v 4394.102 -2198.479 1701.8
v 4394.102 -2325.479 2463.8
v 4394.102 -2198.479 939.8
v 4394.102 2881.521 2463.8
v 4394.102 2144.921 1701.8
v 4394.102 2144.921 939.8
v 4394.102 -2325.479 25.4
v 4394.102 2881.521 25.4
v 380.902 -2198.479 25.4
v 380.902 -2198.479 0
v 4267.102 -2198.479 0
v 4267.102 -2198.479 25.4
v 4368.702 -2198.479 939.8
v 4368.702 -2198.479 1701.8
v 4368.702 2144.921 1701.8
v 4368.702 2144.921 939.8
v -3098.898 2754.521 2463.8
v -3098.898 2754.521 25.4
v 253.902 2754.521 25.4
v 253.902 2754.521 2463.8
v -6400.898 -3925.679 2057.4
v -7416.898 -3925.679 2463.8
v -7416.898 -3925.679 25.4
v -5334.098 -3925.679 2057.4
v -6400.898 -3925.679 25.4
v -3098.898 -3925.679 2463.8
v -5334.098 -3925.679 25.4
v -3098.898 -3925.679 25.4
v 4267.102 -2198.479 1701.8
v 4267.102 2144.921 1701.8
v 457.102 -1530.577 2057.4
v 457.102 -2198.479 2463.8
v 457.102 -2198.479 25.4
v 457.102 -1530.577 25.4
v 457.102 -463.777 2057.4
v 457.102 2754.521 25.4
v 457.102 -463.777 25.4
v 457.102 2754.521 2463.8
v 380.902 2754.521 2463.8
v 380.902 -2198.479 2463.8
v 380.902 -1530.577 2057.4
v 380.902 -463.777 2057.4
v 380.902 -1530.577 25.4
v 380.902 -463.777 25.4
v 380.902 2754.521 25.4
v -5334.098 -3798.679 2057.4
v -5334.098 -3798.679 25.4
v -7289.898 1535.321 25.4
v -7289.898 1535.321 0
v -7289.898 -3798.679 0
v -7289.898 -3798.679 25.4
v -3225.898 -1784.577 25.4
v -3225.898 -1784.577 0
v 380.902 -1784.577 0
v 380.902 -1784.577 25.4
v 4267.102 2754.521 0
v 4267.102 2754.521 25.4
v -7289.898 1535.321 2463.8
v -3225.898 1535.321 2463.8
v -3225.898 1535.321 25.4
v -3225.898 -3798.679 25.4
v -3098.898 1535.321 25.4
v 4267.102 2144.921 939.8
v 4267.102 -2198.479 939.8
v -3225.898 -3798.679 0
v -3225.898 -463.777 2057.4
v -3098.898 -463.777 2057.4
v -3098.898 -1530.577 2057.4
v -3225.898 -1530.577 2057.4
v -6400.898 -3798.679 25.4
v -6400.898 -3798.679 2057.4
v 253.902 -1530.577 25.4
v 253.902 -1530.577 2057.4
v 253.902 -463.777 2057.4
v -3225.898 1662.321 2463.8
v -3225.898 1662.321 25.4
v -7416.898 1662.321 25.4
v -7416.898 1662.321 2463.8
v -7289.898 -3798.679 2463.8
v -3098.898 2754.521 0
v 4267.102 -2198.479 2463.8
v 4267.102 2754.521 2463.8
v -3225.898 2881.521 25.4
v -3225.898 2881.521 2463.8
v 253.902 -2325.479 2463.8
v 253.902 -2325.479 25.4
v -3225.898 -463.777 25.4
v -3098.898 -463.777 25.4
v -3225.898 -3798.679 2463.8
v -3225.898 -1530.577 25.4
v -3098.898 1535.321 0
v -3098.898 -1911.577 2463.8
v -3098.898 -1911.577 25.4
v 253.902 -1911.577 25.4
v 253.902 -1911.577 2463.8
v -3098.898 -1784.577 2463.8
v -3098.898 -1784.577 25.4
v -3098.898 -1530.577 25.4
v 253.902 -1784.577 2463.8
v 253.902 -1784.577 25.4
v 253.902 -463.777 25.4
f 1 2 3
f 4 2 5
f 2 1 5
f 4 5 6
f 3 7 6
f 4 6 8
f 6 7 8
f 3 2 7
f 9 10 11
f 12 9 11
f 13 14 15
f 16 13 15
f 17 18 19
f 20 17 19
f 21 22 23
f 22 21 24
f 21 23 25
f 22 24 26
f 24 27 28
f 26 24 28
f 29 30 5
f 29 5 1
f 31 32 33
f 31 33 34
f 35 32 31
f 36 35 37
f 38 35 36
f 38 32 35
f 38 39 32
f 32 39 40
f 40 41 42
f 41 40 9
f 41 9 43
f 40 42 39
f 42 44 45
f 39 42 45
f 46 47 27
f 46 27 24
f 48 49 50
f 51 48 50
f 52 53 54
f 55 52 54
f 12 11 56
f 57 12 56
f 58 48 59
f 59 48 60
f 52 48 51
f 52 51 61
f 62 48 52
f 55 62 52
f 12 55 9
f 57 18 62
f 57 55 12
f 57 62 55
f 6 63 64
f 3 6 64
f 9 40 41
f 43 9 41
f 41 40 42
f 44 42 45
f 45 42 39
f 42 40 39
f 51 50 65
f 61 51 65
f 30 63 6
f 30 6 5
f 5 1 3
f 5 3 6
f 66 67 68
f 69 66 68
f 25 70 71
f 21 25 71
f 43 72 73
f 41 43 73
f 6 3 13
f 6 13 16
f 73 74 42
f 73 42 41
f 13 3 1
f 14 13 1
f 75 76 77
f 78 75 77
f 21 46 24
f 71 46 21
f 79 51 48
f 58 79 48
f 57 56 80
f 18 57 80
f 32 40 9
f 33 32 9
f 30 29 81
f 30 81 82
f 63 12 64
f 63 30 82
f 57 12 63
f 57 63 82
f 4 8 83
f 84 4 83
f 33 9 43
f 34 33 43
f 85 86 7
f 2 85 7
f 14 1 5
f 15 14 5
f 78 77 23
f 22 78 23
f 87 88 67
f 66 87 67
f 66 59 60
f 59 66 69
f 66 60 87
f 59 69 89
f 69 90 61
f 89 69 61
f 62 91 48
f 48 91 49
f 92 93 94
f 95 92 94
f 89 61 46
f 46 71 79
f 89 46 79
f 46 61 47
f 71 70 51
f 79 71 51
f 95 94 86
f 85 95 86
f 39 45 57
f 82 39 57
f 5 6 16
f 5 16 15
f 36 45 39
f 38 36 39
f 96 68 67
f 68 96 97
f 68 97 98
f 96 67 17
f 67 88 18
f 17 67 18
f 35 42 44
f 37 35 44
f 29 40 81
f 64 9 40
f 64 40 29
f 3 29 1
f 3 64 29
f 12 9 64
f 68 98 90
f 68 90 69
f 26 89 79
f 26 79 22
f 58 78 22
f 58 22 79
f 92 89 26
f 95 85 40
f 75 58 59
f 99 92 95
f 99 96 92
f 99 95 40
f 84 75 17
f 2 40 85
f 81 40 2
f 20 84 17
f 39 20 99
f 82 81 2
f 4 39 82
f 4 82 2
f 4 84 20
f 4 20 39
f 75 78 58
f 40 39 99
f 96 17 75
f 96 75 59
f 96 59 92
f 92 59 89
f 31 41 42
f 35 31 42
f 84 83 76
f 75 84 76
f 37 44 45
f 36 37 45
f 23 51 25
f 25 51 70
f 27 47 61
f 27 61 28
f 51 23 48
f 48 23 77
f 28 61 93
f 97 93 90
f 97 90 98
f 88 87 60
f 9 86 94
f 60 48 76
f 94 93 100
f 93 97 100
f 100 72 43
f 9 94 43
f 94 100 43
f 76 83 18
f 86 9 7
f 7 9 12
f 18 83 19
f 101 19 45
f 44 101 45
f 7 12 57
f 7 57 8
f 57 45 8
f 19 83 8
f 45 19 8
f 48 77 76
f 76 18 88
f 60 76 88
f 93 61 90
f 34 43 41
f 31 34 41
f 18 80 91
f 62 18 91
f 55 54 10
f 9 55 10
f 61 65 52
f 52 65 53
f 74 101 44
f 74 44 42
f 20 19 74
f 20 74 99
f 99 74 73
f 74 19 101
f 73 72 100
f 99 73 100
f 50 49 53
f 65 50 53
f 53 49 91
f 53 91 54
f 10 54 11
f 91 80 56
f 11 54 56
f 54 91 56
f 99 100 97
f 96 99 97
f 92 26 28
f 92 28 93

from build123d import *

# Parameters (mm, degrees)
F1_DEPTH      = 25.4
F2_W          = 3886.2
F2_H          = 127
F2_W_2        = 127
F2_H_2        = 4953
F2_W_3        = 4064
F3_DEPTH      = 2438.4
F4_W          = 1066.8
F4_H          = 2032
F5_DEPTH      = 127
F5_DEPTH_BACK = 3530.6
F6_W          = 1066.8
F6_H          = 2032
F7_DEPTH      = 127
F8_W          = 4343.4
F8_H          = 762
F9_DEPTH      = 127
F10_W         = 4343.4
F10_H         = 762
F11_DEPTH     = 25.4
F13_DEPTH     = 2438.4
F18_DEPTH     = 76.2


with BuildPart() as f1:
    # F0 (on Top) → F1 (new body)
    with BuildSketch(Plane.XY):
        Polygon((4267.1020812988, 2754.5213634491), (380.9020812988, 2754.5213634491), (-3098.8979187012, 2754.5213634491), (-3098.8979187012, 1535.3213634491), (-7289.8979187012, 1535.3213634491), (-7289.8979187012, -3798.6786365509), (-3225.8979187012, -3798.6786365509), (-3225.8979187012, -1784.5769438744), (380.9020812988, -1784.5769438744), (380.9020812988, -2198.4786365509), (4267.1020812988, -2198.4786365509), align=None)
    extrude(amount=F1_DEPTH)


with BuildPart() as f3:
    # F2 (on face) → F3 (new body)
    with BuildSketch(Plane.XY.offset(25.4)):
        with Locations((2324.0020812988, -2261.9786365509)):
            Rectangle(F2_W, F2_H)
        Polygon((380.9020812988, -2325.4786365509), (380.9020812988, -2198.4786365509), (380.9020812988, -1991.5277902126), (380.9020812988, -1784.5769438744), (380.9020812988, 2754.5213634491), (253.9020812988, 2754.5213634491), (253.9020812988, -1784.5769438744), (-3098.8979187012, -1784.5769438744), (-3225.8979187012, -1784.5769438744), (-3225.8979187012, -1991.5277902126), (-3225.8979187012, -3798.6786365509), (-3225.8979187012, -3925.6786365509), (-3098.8979187012, -3925.6786365509), (-3098.8979187012, -1911.5769438744), (253.9020812988, -1911.5769438744), (253.9020812988, -2325.4786365509), align=None)
        with Locations((4330.6020812988, 278.0213634491)):
            Rectangle(F2_W_2, F2_H_2)
        with Locations((4330.6020812988, -2261.9786365509)):
            Rectangle(F2_W_2, F2_H)
        Polygon((380.9020812988, 2754.5213634491), (4267.1020812988, 2754.5213634491), (4394.1020812988, 2754.5213634491), (4394.1020812988, 2881.5213634491), (-3098.8979187012, 2881.5213634491), (-3098.8979187012, 2754.5213634491), (253.9020812988, 2754.5213634491), align=None)
        Polygon((-3098.8979187012, 2754.5213634491), (-3098.8979187012, 2881.5213634491), (-3225.8979187012, 2881.5213634491), (-3225.8979187012, 1662.3213634491), (-3225.8979187012, 1535.3213634491), (-3225.8979187012, -1784.5769438744), (-3098.8979187012, -1784.5769438744), (-3098.8979187012, 1535.3213634491), (-3098.8979187012, 1662.3213634491), align=None)
        Polygon((-7416.8979187012, -3925.6786365509), (-3225.8979187012, -3925.6786365509), (-3225.8979187012, -3798.6786365509), (-7289.8979187012, -3798.6786365509), (-7416.8979187012, -3798.6786365509), align=None)
        with Locations((-5257.8979187012, 1598.8213634491)):
            Rectangle(F2_W_3, F2_H)
        Polygon((-7289.8979187012, 1535.3213634491), (-7289.8979187012, 1662.3213634491), (-7416.8979187012, 1662.3213634491), (-7416.8979187012, -3798.6786365509), (-7289.8979187012, -3798.6786365509), align=None)
    extrude(amount=F3_DEPTH)

    # F4 (on face) → F5 (cut, two sides)
    with BuildSketch(Plane(origin=(253.9020812988, 0, 0), x_dir=(0, -1, 0), z_dir=(-1, 0, 0))) as f5_sk:
        with Locations((997.1769438744, 1041.4)):
            Rectangle(F4_W, F4_H)
    extrude(amount=-F5_DEPTH, mode=Mode.SUBTRACT)
    extrude(f5_sk.sketch, amount=F5_DEPTH_BACK, mode=Mode.SUBTRACT)

    # F6 (on face) → F7 (cut)
    with BuildSketch(Plane(origin=(0, -3798.6786365509, 0), x_dir=(-1, 0, 0), z_dir=(0, 1, 0))):
        with Locations((5867.4979187012, 1041.4)):
            Rectangle(F6_W, F6_H)
    extrude(amount=-F7_DEPTH, mode=Mode.SUBTRACT)

    # F8 (on face) → F9 (cut)
    with BuildSketch(Plane(origin=(4267.1020812988, 0, 0), x_dir=(0, -1, 0), z_dir=(-1, 0, 0))):
        with Locations((26.7786365509, 1320.8)):
            Rectangle(F8_W, F8_H)
    extrude(amount=-F9_DEPTH, mode=Mode.SUBTRACT)


with BuildPart() as f11:
    # F10 (on face) → F11 (new body)
    with BuildSketch(Plane.YZ.offset(4394.1020812988)):
        with Locations((-26.7786365509, 1320.8)):
            Rectangle(F10_W, F10_H)
    extrude(amount=-F11_DEPTH)


with BuildPart() as f13:
    # F12 (on face) → F13 (new body)
    with BuildSketch(Plane.XY.offset(25.4)):
        Polygon((2031.9020812988, 2754.5213634491), (380.9020812988, 2754.5213634491), (380.9020812988, 595.5213634491), (380.9020812988, 290.7213634491), (2336.7020812988, 2754.5213634491), align=None)
    extrude(amount=F13_DEPTH)


with BuildPart() as f14_1:
    # F14: copy of F13
    add(f13.part)


with BuildPart() as f18:
    # F17 (on face) → F18 (new body)
    with BuildSketch(Plane.YZ.offset(380.9020812988)):
        Polygon((-463.7769438744, 25.4), (2754.5213634491, 25.4), (2754.5213634491, 2463.8), (-2198.4786365509, 2463.8), (-2198.4786365509, 25.4), (-1530.5769438744, 25.4), (-1530.5769438744, 2057.4), (-463.7769438744, 2057.4), align=None)
    extrude(amount=F18_DEPTH)


solid = Compound([f1.part, f3.part, f11.part, f18.part])
